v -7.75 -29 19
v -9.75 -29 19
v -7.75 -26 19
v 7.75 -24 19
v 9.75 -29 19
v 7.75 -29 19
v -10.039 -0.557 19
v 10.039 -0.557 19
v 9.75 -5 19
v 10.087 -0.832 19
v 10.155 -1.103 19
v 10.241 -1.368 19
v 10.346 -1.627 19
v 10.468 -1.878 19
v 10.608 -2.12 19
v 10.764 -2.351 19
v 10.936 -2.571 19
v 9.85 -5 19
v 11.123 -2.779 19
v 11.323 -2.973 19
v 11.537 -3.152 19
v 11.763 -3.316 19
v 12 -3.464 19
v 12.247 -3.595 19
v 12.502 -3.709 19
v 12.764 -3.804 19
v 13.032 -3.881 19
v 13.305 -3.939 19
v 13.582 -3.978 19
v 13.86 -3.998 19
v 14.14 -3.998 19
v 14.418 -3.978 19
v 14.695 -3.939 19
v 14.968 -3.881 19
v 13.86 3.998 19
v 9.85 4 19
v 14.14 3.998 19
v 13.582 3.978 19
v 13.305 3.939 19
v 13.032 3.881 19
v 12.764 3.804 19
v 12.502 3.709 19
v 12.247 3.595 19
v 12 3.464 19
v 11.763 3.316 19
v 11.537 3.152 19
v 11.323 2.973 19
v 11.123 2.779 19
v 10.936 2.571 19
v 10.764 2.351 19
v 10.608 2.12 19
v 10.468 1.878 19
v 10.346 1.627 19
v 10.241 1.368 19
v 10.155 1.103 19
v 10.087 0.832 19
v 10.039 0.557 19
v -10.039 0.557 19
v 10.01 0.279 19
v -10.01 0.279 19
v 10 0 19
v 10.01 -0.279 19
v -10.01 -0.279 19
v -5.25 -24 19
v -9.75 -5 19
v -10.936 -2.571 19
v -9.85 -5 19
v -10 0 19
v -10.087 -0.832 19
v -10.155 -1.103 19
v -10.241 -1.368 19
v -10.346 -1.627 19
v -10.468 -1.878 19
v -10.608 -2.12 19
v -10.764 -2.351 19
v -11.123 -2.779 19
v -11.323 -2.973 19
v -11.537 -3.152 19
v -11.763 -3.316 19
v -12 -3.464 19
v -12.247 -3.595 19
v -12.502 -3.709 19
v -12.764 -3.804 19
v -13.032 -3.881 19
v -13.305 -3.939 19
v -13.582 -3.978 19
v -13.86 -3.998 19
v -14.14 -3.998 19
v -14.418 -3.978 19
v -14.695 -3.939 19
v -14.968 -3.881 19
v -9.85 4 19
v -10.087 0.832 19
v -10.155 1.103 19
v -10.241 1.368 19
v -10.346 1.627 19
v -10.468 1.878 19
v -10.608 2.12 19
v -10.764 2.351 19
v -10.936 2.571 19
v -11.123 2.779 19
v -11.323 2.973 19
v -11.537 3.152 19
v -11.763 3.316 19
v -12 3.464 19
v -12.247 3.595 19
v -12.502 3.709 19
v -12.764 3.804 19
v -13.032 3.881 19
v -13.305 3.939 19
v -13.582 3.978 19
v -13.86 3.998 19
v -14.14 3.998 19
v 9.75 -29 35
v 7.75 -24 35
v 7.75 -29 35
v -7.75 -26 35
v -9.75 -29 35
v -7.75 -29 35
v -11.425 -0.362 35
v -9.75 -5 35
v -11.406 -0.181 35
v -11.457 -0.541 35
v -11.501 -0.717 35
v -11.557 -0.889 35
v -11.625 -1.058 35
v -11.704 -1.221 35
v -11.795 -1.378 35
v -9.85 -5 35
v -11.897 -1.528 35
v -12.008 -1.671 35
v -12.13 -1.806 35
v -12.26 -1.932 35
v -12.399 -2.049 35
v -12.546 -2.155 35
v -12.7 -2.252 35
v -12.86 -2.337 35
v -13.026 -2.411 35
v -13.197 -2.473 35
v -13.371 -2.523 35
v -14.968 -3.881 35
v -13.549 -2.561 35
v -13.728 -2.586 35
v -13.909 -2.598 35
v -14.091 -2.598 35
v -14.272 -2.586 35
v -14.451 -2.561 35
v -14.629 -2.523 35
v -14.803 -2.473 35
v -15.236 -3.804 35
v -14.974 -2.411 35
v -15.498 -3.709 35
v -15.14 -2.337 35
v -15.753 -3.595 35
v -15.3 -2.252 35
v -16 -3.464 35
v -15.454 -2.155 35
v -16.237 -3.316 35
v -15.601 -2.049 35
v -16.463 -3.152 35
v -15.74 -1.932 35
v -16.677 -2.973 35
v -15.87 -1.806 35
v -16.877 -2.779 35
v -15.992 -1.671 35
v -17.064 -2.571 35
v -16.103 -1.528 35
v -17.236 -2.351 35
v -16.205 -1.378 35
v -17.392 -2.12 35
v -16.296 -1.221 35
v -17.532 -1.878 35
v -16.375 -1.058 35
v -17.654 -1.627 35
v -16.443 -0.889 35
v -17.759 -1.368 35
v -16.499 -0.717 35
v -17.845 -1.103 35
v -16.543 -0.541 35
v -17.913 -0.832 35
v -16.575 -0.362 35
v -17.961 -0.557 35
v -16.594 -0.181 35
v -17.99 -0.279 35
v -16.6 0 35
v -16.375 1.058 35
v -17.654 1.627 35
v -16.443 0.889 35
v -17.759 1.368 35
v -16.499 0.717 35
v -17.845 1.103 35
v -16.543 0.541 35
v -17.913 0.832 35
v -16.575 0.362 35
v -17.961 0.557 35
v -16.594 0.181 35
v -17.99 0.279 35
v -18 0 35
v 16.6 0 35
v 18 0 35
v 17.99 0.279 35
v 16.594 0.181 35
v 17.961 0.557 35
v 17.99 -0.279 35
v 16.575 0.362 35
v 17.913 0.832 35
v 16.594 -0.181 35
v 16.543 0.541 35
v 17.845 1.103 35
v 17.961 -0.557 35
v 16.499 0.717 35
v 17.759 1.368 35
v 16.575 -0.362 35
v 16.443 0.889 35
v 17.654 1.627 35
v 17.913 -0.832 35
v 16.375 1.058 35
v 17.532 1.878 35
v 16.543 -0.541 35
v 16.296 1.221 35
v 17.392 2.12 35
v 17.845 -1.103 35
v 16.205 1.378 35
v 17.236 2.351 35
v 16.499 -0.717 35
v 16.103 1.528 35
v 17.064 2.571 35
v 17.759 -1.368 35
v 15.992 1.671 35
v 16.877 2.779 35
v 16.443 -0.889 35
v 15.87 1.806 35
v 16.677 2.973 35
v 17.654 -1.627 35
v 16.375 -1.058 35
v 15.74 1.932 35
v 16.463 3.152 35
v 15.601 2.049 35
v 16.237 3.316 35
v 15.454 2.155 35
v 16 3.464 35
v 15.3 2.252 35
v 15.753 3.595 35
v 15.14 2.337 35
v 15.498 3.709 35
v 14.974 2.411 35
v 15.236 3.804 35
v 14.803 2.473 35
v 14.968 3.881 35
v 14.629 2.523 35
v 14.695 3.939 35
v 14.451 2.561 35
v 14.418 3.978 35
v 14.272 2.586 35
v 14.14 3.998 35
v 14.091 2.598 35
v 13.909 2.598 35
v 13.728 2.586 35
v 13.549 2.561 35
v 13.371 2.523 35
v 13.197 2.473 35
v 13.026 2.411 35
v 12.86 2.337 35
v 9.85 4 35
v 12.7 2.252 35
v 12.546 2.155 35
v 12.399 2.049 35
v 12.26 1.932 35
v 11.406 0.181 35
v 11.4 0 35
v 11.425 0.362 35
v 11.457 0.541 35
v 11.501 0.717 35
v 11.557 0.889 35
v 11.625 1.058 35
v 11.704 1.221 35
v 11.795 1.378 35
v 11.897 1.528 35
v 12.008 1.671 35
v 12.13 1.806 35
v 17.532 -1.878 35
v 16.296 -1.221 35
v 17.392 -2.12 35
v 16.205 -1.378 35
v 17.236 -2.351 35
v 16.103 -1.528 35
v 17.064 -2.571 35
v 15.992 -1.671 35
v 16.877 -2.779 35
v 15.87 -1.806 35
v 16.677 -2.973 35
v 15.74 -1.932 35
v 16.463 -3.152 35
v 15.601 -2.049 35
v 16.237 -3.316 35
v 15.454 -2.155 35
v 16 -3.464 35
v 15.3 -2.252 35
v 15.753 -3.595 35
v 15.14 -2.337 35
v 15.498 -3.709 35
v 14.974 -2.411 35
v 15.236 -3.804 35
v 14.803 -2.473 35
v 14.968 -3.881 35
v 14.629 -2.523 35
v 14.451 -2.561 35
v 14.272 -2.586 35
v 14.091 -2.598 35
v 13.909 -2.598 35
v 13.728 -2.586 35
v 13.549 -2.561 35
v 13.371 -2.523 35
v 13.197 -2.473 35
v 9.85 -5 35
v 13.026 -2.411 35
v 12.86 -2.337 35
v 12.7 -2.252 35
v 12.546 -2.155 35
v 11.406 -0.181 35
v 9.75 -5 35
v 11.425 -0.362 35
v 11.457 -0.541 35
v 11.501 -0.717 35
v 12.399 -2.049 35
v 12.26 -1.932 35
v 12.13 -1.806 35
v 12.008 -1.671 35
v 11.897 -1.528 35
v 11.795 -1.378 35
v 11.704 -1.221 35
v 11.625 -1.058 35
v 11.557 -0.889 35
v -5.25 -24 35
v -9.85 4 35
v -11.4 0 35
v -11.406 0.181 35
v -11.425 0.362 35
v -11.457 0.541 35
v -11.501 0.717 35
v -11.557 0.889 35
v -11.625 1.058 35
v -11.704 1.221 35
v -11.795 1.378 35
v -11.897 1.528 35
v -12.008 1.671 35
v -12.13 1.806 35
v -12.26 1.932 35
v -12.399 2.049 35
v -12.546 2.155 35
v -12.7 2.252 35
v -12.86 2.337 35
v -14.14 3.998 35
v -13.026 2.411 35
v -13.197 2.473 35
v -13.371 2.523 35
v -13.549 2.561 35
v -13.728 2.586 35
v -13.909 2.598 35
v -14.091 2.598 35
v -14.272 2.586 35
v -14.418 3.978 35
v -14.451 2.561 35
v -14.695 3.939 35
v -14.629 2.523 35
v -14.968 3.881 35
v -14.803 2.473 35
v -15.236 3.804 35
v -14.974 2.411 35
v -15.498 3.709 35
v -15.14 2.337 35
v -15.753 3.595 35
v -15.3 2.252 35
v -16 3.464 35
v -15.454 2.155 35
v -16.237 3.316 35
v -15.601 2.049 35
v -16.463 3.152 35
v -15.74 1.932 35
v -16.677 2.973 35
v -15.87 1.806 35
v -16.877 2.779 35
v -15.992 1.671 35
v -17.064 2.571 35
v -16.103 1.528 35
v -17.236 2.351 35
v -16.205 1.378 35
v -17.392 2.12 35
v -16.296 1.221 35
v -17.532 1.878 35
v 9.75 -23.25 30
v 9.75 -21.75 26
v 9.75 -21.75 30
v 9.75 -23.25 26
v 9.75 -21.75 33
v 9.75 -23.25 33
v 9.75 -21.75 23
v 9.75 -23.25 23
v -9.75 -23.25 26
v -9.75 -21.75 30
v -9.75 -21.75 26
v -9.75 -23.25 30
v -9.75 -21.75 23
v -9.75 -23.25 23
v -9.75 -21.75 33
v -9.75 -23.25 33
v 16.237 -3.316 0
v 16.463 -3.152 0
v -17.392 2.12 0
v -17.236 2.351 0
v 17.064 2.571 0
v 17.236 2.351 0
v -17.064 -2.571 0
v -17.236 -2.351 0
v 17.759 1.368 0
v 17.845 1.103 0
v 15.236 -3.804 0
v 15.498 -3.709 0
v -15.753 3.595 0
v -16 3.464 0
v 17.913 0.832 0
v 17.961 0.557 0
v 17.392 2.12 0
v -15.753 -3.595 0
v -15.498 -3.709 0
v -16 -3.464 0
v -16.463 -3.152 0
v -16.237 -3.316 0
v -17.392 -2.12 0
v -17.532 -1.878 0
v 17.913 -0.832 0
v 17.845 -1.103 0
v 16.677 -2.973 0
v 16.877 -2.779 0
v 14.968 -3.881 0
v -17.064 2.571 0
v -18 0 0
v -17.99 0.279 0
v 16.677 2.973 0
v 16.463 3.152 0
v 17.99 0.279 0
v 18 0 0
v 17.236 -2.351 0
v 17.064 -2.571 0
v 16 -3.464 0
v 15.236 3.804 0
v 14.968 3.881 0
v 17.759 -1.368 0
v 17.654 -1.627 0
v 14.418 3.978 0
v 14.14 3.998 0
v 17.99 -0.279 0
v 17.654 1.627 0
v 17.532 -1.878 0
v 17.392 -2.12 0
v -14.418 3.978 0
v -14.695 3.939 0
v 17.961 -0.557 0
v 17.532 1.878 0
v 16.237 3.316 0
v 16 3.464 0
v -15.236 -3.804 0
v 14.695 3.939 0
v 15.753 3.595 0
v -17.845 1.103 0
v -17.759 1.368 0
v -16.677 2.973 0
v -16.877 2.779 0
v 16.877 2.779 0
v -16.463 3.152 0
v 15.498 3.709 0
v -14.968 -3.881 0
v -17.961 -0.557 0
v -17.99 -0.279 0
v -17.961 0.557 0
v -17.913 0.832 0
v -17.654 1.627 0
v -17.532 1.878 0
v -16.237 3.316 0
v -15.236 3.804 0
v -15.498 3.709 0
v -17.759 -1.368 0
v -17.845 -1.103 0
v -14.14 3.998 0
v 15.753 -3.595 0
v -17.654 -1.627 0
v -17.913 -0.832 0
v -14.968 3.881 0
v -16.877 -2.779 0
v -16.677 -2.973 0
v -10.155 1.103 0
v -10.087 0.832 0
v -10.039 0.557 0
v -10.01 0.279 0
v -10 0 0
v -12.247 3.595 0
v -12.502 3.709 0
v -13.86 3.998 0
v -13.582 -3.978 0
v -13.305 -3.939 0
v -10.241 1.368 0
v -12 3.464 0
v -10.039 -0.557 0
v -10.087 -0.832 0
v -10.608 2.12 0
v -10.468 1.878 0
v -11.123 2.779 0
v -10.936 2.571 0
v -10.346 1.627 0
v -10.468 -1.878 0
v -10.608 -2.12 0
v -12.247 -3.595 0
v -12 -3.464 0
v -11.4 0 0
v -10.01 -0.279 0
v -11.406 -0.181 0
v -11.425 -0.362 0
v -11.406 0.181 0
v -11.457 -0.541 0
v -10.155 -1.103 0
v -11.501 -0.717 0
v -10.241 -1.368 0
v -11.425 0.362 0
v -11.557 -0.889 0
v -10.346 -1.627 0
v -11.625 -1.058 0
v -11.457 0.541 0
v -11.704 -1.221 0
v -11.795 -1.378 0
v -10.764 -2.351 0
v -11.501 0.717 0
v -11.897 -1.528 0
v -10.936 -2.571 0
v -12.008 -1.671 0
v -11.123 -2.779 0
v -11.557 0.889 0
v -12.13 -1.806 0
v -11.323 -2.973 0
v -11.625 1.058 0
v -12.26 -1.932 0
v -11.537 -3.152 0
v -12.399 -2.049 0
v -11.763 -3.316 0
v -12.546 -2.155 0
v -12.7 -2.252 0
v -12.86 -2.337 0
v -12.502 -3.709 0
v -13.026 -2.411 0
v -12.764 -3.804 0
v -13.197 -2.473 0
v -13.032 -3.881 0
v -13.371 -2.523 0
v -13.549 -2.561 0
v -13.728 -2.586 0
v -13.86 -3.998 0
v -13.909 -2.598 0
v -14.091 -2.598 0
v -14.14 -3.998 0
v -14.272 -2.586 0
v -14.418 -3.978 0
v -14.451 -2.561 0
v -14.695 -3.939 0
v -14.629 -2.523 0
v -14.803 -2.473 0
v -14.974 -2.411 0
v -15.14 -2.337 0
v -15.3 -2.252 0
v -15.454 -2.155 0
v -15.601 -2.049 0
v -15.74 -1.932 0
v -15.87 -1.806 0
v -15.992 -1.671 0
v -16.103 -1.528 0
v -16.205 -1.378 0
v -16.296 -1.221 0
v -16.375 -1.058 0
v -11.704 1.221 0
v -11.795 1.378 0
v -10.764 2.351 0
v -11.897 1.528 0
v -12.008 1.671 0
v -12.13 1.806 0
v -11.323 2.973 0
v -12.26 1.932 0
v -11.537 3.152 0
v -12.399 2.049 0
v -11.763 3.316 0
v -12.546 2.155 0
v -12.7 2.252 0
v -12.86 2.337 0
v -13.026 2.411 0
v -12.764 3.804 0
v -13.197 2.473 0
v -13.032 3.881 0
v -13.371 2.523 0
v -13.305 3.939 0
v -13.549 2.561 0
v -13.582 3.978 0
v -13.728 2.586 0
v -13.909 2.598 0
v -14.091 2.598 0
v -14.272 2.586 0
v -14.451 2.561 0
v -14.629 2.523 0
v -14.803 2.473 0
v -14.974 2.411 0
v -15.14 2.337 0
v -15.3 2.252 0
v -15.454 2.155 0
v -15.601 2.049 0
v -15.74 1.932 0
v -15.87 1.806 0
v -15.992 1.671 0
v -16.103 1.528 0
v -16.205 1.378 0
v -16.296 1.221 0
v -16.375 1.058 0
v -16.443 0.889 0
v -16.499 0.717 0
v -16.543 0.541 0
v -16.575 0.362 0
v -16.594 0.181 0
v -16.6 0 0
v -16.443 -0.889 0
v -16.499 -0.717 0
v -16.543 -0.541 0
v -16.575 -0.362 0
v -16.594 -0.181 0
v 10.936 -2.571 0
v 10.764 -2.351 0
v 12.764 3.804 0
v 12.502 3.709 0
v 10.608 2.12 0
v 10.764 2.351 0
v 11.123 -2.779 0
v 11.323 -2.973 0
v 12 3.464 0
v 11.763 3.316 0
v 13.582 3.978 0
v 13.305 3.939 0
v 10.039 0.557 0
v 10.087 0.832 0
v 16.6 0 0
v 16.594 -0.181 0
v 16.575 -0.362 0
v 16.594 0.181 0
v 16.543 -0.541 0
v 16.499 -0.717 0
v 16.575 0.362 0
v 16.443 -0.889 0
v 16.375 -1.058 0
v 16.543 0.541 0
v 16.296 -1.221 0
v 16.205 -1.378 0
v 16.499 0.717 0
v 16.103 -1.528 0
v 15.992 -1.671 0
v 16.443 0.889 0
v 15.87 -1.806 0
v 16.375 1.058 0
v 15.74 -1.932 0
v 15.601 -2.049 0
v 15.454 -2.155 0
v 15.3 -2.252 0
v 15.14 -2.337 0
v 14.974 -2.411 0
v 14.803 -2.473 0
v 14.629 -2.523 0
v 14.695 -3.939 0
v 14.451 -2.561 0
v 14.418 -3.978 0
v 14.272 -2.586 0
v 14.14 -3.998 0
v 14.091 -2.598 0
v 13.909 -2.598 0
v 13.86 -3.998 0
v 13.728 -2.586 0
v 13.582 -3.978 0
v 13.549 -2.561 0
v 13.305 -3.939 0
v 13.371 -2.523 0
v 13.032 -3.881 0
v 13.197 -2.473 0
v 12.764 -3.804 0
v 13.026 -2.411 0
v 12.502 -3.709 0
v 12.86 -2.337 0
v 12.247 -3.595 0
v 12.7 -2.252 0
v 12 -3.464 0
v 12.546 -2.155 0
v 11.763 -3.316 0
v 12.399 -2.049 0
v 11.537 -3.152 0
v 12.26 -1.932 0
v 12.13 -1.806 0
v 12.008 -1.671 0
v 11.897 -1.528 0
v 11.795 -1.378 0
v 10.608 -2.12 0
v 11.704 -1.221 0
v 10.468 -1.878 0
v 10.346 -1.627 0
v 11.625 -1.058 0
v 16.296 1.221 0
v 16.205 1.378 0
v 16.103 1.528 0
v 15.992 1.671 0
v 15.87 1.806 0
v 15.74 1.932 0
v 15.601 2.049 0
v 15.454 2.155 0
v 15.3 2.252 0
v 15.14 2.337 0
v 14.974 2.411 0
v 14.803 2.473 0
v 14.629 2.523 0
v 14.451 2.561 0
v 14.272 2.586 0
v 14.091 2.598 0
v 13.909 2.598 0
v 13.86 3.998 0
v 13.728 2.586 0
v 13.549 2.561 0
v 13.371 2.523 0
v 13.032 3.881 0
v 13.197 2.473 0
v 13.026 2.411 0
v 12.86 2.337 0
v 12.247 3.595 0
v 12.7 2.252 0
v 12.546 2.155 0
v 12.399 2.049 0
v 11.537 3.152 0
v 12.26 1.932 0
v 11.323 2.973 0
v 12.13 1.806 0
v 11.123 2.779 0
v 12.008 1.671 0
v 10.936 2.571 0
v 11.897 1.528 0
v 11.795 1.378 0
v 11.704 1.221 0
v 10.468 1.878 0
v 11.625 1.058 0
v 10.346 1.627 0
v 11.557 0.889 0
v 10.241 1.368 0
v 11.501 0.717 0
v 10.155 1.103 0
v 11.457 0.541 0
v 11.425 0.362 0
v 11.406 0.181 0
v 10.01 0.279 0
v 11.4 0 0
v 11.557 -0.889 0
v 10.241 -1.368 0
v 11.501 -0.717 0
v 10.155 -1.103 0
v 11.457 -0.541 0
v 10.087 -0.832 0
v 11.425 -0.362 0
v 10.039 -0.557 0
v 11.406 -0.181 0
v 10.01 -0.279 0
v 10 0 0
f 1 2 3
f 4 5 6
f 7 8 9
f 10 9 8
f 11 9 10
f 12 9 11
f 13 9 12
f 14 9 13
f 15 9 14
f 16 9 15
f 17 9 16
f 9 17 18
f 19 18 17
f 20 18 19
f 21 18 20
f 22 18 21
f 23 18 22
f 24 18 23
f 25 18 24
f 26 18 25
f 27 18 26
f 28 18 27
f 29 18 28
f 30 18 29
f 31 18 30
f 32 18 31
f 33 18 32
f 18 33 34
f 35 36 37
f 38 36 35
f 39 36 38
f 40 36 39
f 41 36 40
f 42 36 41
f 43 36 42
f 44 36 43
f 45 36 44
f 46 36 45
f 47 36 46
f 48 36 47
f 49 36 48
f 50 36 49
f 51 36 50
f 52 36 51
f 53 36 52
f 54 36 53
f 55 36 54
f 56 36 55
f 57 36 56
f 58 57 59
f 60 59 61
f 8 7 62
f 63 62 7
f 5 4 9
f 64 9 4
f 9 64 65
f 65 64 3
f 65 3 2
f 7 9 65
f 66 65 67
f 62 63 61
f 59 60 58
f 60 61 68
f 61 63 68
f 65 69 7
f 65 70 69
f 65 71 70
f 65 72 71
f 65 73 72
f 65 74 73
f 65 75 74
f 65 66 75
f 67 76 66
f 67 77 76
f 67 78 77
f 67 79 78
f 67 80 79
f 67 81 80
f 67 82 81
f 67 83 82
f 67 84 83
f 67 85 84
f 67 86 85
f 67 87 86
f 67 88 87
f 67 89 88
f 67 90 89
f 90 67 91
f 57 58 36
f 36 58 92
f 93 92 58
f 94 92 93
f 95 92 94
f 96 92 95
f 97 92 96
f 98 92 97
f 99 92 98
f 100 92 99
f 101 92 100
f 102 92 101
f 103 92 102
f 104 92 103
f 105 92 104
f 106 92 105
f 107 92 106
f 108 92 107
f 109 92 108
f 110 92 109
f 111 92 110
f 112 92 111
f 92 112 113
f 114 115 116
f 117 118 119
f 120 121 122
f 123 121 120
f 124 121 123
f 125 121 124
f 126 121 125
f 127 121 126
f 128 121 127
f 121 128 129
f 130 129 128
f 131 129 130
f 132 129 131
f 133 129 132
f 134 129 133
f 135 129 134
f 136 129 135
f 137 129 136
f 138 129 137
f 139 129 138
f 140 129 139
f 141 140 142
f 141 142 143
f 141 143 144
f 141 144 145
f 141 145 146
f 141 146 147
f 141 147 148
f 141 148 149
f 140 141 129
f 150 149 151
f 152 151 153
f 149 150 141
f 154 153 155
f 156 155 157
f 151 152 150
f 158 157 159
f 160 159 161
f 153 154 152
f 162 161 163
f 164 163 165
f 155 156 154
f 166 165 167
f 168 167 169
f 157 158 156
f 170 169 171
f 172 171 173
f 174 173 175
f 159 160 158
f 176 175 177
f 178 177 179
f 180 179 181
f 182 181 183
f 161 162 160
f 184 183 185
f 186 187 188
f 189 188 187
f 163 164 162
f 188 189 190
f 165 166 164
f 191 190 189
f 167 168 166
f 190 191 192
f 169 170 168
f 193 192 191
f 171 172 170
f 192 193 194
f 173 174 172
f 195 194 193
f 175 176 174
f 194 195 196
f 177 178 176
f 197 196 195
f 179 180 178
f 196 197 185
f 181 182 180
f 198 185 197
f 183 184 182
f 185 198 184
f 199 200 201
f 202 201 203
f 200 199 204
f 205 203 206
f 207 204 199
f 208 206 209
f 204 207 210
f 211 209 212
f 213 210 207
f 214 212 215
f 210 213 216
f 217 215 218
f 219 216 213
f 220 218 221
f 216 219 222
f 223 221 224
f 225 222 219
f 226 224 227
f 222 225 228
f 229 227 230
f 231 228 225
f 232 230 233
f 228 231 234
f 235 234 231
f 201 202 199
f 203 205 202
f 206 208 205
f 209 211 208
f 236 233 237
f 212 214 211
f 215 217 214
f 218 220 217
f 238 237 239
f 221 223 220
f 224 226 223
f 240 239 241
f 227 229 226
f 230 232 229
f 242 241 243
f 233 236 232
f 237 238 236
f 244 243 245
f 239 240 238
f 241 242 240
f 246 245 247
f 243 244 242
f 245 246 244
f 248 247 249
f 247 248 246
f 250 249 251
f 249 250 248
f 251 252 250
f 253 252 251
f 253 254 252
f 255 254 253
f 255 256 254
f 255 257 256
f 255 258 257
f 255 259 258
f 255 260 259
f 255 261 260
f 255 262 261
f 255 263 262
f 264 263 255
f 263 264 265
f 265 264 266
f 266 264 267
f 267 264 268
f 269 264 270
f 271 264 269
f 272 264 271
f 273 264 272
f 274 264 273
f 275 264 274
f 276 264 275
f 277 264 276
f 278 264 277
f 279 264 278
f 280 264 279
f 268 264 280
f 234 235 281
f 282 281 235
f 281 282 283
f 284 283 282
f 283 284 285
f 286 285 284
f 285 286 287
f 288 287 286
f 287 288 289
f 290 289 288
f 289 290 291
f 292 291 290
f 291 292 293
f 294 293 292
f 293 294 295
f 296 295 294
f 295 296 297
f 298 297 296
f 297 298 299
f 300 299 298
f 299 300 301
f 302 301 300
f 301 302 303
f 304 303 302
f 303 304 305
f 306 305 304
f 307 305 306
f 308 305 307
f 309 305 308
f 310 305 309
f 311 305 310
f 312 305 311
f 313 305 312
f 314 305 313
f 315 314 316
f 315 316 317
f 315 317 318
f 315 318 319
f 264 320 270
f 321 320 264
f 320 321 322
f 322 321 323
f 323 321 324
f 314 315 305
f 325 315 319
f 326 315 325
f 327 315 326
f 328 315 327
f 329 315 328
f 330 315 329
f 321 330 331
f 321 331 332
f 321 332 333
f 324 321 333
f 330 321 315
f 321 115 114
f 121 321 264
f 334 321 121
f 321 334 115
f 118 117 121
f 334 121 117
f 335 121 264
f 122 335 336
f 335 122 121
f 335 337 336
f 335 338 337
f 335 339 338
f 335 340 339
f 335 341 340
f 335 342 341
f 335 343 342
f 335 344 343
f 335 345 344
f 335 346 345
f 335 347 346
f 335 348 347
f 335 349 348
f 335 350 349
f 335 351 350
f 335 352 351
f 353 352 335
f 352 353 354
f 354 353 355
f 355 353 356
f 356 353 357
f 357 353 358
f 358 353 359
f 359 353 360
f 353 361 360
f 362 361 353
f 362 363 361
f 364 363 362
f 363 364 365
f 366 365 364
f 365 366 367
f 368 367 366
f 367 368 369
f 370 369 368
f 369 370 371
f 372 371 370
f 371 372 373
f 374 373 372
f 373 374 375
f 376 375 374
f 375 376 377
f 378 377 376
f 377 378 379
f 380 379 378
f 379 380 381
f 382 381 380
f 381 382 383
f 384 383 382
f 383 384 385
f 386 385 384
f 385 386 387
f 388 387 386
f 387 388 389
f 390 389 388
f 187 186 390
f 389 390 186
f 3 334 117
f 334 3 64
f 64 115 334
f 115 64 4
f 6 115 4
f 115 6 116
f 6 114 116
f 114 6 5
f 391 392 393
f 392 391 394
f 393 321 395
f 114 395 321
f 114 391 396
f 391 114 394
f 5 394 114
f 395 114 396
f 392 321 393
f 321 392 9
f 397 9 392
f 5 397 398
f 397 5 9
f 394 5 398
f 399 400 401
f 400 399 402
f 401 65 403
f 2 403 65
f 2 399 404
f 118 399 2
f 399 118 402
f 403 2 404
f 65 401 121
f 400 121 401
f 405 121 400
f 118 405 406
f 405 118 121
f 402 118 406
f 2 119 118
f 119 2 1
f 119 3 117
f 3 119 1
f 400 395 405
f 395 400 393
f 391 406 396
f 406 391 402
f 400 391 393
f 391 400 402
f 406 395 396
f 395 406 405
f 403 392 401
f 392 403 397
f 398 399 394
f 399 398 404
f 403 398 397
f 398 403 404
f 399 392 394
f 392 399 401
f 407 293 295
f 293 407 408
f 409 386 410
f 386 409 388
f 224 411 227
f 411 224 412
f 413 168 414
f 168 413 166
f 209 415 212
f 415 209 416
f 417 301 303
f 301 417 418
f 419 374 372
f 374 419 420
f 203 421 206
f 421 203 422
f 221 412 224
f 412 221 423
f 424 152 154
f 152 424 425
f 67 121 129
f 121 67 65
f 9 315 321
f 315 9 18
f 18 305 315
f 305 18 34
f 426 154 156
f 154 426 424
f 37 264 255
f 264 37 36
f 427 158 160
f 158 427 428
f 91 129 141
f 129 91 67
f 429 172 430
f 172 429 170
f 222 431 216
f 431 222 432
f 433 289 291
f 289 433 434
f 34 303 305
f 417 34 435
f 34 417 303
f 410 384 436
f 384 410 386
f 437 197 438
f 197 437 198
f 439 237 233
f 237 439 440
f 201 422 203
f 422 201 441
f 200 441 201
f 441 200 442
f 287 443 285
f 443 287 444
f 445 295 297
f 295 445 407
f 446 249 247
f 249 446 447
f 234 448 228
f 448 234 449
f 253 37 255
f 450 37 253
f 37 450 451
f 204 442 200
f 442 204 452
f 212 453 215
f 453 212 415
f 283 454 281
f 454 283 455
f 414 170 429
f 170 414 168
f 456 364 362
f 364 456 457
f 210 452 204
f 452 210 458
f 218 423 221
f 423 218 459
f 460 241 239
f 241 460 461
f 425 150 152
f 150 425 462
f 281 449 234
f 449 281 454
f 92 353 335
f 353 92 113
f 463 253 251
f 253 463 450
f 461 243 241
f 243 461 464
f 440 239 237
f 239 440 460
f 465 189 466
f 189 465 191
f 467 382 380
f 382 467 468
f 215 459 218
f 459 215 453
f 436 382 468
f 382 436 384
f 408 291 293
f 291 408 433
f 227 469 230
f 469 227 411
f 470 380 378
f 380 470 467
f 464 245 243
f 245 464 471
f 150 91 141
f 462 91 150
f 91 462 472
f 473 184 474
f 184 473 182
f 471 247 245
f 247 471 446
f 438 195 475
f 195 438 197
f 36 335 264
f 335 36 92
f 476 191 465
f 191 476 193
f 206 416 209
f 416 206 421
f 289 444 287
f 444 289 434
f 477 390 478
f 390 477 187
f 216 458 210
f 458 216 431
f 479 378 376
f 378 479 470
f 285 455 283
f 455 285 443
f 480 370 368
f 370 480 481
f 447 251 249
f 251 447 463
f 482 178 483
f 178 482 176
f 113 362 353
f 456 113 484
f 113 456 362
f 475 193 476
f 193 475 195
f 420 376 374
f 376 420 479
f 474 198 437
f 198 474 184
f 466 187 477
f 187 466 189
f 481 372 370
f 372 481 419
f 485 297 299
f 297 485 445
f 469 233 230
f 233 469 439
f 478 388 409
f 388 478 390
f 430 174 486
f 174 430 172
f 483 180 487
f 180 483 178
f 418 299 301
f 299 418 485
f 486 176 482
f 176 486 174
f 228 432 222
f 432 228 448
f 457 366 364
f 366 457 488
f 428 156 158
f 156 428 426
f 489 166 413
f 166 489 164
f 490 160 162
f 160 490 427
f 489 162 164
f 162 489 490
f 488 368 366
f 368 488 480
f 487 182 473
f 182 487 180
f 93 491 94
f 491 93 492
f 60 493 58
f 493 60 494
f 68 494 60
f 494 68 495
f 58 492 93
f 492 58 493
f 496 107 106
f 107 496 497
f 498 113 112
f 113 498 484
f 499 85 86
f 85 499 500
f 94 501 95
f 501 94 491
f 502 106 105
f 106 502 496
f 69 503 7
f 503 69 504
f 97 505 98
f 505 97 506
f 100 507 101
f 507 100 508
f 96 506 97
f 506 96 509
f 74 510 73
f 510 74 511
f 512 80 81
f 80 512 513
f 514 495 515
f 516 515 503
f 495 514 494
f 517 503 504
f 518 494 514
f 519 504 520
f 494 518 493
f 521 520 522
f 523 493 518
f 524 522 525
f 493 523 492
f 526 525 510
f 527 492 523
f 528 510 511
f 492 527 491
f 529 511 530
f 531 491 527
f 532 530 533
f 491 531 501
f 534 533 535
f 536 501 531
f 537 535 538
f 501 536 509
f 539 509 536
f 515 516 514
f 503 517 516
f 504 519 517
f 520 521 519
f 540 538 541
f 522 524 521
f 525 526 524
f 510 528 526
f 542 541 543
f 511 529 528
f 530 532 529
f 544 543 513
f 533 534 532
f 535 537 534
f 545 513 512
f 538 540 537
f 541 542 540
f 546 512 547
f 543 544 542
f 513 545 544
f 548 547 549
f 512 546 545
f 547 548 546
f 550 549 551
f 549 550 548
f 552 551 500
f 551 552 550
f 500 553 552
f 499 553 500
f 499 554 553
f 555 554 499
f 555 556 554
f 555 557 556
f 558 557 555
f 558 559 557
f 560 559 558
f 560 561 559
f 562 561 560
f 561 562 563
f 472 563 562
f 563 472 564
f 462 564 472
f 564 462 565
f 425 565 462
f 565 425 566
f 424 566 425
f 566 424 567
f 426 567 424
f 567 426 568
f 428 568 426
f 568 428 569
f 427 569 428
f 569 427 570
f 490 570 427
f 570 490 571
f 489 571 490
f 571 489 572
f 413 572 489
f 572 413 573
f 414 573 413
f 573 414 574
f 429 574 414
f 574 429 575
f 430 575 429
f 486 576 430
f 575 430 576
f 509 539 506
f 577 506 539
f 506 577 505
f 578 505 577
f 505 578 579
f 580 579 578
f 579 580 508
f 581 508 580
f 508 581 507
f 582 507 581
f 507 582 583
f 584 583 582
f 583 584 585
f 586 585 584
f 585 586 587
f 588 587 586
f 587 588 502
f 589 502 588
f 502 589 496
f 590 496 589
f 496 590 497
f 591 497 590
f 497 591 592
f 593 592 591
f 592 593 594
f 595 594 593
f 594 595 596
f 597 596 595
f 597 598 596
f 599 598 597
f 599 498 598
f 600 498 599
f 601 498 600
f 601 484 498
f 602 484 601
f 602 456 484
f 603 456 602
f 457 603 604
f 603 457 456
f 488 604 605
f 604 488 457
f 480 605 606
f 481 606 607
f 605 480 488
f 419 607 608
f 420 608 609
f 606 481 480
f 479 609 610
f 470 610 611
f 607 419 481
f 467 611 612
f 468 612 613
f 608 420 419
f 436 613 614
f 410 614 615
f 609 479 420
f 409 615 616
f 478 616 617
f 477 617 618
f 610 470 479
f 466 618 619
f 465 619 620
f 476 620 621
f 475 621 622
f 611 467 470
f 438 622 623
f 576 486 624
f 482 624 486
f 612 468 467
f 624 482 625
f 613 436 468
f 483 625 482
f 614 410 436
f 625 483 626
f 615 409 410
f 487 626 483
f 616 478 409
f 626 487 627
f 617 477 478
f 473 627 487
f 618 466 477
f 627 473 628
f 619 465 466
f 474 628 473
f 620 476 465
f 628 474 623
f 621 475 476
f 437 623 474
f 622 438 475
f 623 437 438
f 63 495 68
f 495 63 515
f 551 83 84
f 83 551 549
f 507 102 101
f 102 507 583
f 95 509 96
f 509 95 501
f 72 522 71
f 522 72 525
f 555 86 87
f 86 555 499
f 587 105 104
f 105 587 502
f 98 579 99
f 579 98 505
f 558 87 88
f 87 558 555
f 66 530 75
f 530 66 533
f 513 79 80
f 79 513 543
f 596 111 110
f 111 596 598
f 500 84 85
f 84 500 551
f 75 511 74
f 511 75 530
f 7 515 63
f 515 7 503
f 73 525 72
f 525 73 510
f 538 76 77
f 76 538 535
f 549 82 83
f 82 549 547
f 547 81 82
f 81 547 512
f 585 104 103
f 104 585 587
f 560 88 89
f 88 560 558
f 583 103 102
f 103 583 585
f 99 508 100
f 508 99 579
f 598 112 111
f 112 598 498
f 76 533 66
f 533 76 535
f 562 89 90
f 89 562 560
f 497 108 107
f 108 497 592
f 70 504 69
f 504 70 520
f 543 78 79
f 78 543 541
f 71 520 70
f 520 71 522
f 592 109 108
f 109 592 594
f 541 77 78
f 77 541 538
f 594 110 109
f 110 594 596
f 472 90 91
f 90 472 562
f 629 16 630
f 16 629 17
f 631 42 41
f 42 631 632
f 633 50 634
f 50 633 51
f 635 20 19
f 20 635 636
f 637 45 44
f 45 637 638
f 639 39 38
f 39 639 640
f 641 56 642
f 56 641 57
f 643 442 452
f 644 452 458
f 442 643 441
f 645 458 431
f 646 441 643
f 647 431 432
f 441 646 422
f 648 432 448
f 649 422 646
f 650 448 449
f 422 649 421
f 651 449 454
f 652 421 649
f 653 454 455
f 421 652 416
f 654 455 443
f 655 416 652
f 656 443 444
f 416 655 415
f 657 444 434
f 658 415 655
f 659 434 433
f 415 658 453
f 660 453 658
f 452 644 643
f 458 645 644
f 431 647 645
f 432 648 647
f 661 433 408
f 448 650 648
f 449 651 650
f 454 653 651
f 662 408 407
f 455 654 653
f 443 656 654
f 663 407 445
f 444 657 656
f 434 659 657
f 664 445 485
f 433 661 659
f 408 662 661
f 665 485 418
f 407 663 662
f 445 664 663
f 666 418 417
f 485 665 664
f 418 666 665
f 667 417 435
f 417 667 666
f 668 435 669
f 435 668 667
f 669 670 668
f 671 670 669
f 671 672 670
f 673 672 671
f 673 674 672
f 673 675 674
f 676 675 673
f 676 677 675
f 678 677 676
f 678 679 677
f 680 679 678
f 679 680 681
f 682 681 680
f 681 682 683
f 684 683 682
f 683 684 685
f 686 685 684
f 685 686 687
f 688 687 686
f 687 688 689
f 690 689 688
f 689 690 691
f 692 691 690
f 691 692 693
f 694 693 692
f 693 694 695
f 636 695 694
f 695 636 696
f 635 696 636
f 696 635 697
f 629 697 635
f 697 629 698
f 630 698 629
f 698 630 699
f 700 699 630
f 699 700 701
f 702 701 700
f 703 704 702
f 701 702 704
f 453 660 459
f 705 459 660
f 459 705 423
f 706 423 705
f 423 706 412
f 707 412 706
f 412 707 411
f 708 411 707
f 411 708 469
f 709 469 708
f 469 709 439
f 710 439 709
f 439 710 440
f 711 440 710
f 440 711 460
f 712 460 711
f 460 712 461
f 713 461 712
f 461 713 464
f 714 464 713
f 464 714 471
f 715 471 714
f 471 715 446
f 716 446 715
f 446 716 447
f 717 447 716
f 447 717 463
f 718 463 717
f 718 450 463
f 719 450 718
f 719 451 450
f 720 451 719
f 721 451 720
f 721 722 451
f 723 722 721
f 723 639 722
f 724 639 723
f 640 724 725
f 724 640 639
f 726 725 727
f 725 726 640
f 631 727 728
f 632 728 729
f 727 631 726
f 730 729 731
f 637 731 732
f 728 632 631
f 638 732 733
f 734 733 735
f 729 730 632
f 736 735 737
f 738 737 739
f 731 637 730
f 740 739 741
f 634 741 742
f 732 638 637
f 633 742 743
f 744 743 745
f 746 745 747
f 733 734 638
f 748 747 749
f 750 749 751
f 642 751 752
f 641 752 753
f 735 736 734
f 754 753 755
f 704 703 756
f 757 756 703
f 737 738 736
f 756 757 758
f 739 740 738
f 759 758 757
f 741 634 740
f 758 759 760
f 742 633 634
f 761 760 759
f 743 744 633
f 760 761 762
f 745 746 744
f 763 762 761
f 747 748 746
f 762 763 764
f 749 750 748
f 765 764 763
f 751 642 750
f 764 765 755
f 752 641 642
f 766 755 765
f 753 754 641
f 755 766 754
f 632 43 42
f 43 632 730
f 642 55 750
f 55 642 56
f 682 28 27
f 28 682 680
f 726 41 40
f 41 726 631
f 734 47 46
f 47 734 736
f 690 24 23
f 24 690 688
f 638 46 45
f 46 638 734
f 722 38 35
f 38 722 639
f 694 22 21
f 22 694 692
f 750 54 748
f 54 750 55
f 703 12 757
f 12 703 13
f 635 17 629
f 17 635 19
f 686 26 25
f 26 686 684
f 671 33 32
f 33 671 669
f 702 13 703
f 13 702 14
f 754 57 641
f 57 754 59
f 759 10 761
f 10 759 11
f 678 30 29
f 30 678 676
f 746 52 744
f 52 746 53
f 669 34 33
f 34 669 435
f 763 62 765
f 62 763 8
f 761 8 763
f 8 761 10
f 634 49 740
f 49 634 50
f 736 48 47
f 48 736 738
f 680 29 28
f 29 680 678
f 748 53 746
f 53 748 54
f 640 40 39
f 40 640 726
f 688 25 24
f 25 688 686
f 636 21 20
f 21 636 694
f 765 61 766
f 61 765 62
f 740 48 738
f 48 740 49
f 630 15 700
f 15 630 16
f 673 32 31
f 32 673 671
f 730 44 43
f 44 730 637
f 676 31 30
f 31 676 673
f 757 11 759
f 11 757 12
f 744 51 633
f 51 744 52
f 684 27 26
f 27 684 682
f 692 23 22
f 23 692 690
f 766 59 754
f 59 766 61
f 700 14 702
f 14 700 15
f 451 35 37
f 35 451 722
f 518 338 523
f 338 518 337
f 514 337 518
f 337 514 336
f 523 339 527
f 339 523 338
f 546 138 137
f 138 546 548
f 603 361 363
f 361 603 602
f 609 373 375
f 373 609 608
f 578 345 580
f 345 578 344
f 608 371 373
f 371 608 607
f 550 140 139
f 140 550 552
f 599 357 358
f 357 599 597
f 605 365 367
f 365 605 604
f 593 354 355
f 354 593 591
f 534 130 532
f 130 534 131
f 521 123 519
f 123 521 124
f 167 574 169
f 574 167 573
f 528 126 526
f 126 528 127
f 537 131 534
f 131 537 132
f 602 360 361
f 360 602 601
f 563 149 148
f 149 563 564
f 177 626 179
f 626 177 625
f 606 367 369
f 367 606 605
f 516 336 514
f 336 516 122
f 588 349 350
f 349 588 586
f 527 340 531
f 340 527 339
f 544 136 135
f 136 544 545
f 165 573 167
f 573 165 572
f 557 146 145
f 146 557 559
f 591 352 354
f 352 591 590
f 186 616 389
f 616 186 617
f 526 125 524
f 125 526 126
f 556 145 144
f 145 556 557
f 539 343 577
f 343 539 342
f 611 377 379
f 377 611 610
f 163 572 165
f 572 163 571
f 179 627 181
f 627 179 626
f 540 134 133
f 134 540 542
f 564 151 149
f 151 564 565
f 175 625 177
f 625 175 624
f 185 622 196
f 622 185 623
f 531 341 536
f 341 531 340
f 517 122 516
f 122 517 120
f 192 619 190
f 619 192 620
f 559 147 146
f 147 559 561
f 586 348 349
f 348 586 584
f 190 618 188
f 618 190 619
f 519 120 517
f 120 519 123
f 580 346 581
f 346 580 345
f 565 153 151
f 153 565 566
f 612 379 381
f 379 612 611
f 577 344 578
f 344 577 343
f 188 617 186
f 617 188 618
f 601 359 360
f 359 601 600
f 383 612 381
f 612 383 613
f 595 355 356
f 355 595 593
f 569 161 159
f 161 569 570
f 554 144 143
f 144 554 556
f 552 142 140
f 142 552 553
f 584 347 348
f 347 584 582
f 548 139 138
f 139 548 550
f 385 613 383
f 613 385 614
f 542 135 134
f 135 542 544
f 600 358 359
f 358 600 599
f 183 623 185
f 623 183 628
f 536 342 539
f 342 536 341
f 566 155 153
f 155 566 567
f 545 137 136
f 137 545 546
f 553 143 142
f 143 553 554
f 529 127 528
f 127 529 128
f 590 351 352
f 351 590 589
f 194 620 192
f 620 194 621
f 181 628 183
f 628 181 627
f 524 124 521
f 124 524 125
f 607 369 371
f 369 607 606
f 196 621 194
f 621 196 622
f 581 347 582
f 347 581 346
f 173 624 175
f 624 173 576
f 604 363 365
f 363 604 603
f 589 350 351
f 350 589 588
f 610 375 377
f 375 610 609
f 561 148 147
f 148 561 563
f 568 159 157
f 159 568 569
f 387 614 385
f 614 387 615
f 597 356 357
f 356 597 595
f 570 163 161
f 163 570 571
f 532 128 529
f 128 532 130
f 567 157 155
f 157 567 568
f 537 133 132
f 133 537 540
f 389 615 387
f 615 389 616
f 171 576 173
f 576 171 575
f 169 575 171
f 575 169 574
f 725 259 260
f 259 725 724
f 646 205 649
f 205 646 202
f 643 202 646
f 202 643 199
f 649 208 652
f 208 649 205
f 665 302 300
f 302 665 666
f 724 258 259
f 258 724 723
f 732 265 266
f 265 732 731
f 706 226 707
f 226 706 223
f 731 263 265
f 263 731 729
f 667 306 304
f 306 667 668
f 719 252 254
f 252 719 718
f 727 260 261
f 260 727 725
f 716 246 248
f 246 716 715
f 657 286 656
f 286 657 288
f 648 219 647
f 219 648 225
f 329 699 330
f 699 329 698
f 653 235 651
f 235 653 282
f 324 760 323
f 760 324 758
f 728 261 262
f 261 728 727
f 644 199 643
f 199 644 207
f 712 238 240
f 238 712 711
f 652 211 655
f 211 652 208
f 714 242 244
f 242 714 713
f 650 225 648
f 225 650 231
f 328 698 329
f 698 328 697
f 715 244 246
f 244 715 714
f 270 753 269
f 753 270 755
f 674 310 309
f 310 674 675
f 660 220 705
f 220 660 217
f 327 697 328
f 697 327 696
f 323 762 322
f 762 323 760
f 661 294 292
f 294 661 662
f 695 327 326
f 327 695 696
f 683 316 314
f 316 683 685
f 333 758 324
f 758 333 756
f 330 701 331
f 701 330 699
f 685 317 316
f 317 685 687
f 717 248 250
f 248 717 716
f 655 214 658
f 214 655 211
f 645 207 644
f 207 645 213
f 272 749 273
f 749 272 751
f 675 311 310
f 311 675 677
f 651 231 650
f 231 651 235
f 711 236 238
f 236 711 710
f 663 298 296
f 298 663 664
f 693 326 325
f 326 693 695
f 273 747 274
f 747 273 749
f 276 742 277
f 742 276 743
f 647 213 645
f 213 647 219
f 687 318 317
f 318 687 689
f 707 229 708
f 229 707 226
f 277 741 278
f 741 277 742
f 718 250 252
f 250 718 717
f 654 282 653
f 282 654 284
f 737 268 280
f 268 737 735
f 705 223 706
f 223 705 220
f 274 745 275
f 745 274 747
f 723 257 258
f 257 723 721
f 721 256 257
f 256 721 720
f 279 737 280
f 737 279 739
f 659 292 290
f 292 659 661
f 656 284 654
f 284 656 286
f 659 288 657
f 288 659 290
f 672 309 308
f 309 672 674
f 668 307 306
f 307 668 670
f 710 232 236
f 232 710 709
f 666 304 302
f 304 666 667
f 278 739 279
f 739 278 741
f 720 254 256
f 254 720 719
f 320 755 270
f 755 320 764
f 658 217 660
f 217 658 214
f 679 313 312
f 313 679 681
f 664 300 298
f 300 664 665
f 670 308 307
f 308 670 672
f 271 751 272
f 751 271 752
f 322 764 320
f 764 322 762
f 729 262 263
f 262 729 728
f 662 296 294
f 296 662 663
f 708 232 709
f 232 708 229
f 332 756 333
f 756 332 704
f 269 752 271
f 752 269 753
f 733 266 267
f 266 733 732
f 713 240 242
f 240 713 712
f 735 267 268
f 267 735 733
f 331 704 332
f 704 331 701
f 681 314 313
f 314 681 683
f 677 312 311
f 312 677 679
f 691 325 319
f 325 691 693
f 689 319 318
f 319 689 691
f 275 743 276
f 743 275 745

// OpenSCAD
$fn = 90*1;

EPS = 0.1*1;
WAND = 2*1;


CABLE_TIE_WIDTH = 3*1;
CABLE_TIE_THICK = 1.5*1;

// Inner diameter of standoffs
STANDOFF_DIAMETER = 5; // [3:6]
STANDOFF_DIA = STANDOFF_DIAMETER + 0.2;

// Outer diameter of standoffs
STANDOFF_OUTER_DIAMETER = STANDOFF_DIAMETER + 3;

// Length of standoffs
STANDOFF_LENGTH = 35; // [16:60]

// Distance between standoffs (middle to middle)
STANDOFF_DISTANCE = 28; // [15:50]

// Distance from middle of standoffs to XT60 connector
DISTANCE_STANDOFF_XT60 = 21; // [5:30]

XT60_WIDTH = 15.5*1;
XT60_HEIGHT = 8*1;
XT60_DEPTH = 16*1;


SHIFT = 0*1;

difference() {
	union() {
		translate([0, -DISTANCE_STANDOFF_XT60, STANDOFF_LENGTH - XT60_DEPTH])
			translate([0, -XT60_HEIGHT,  XT60_DEPTH])
				rotate([-90,0,0])
					xt60();
		// laschen
		hull() {
			hull() {
				translate([-STANDOFF_DISTANCE/2 - SHIFT, 0, STANDOFF_LENGTH - XT60_DEPTH])
					cylinder(d = STANDOFF_OUTER_DIAMETER, h = XT60_DEPTH);
				translate([-XT60_WIDTH/2 - WAND - EPS, -5, STANDOFF_LENGTH - XT60_DEPTH])
					cube([EPS, 5 + STANDOFF_OUTER_DIAMETER/2, XT60_DEPTH]);
			}
			hull() {
			translate([STANDOFF_DISTANCE/2 - SHIFT, 0, STANDOFF_LENGTH - XT60_DEPTH])
					cylinder(d = STANDOFF_OUTER_DIAMETER, h = XT60_DEPTH);
				translate([XT60_WIDTH/2 + WAND, -5, STANDOFF_LENGTH - XT60_DEPTH])
					cube([EPS, 5 + STANDOFF_OUTER_DIAMETER/2, XT60_DEPTH]);
			}
		}
		translate([-XT60_WIDTH/2 - WAND, -DISTANCE_STANDOFF_XT60, STANDOFF_LENGTH - XT60_DEPTH])
			cube([XT60_WIDTH+2*WAND, DISTANCE_STANDOFF_XT60 - 5, XT60_DEPTH]);
		// standoff pillars
		translate([-STANDOFF_DISTANCE/2 - SHIFT, 0, 0])
			cylinder(d = STANDOFF_OUTER_DIAMETER, h = STANDOFF_LENGTH);
		translate([STANDOFF_DISTANCE/2 - SHIFT, 0, 0])
			cylinder(d = STANDOFF_OUTER_DIAMETER, h = STANDOFF_LENGTH);
	}
	// holes standoffs
	translate([-STANDOFF_DISTANCE/2 - SHIFT, 0, -EPS])
		cylinder(d = STANDOFF_DIA, h = STANDOFF_LENGTH + 2*EPS);
	translate([STANDOFF_DISTANCE/2 - SHIFT, 0, -EPS])
		cylinder(d = STANDOFF_DIA, h = STANDOFF_LENGTH + 2*EPS);
}
			
module xt60() {
	difference() {
		// XT60 body
		translate([-(XT60_WIDTH + 2*WAND)/2, XT60_DEPTH, 0])
			rotate([90, 0, 0])
				linear_extrude(height = 16, center = false, convexity = 10, twist = 0)
					polygon(points=[[0, 8], [19.5, 8], [19.5, 0], [17.5, 0], [17.5, 5], [4.5, 5], [2, 3], [2, 0], [0, 0]]);
		// cable tie holes
		translate([-XT60_WIDTH/2 - WAND - EPS, 2, 8-1.5/2-1.5])
			cube([XT60_WIDTH + 2*WAND + 2*EPS, CABLE_TIE_WIDTH, CABLE_TIE_THICK]);
		translate([-XT60_WIDTH/2 - WAND - EPS, 9, 8-1.5/2-1.5])
			cube([XT60_WIDTH + 2*WAND + 2*EPS, CABLE_TIE_WIDTH, CABLE_TIE_THICK]);
	}

}
